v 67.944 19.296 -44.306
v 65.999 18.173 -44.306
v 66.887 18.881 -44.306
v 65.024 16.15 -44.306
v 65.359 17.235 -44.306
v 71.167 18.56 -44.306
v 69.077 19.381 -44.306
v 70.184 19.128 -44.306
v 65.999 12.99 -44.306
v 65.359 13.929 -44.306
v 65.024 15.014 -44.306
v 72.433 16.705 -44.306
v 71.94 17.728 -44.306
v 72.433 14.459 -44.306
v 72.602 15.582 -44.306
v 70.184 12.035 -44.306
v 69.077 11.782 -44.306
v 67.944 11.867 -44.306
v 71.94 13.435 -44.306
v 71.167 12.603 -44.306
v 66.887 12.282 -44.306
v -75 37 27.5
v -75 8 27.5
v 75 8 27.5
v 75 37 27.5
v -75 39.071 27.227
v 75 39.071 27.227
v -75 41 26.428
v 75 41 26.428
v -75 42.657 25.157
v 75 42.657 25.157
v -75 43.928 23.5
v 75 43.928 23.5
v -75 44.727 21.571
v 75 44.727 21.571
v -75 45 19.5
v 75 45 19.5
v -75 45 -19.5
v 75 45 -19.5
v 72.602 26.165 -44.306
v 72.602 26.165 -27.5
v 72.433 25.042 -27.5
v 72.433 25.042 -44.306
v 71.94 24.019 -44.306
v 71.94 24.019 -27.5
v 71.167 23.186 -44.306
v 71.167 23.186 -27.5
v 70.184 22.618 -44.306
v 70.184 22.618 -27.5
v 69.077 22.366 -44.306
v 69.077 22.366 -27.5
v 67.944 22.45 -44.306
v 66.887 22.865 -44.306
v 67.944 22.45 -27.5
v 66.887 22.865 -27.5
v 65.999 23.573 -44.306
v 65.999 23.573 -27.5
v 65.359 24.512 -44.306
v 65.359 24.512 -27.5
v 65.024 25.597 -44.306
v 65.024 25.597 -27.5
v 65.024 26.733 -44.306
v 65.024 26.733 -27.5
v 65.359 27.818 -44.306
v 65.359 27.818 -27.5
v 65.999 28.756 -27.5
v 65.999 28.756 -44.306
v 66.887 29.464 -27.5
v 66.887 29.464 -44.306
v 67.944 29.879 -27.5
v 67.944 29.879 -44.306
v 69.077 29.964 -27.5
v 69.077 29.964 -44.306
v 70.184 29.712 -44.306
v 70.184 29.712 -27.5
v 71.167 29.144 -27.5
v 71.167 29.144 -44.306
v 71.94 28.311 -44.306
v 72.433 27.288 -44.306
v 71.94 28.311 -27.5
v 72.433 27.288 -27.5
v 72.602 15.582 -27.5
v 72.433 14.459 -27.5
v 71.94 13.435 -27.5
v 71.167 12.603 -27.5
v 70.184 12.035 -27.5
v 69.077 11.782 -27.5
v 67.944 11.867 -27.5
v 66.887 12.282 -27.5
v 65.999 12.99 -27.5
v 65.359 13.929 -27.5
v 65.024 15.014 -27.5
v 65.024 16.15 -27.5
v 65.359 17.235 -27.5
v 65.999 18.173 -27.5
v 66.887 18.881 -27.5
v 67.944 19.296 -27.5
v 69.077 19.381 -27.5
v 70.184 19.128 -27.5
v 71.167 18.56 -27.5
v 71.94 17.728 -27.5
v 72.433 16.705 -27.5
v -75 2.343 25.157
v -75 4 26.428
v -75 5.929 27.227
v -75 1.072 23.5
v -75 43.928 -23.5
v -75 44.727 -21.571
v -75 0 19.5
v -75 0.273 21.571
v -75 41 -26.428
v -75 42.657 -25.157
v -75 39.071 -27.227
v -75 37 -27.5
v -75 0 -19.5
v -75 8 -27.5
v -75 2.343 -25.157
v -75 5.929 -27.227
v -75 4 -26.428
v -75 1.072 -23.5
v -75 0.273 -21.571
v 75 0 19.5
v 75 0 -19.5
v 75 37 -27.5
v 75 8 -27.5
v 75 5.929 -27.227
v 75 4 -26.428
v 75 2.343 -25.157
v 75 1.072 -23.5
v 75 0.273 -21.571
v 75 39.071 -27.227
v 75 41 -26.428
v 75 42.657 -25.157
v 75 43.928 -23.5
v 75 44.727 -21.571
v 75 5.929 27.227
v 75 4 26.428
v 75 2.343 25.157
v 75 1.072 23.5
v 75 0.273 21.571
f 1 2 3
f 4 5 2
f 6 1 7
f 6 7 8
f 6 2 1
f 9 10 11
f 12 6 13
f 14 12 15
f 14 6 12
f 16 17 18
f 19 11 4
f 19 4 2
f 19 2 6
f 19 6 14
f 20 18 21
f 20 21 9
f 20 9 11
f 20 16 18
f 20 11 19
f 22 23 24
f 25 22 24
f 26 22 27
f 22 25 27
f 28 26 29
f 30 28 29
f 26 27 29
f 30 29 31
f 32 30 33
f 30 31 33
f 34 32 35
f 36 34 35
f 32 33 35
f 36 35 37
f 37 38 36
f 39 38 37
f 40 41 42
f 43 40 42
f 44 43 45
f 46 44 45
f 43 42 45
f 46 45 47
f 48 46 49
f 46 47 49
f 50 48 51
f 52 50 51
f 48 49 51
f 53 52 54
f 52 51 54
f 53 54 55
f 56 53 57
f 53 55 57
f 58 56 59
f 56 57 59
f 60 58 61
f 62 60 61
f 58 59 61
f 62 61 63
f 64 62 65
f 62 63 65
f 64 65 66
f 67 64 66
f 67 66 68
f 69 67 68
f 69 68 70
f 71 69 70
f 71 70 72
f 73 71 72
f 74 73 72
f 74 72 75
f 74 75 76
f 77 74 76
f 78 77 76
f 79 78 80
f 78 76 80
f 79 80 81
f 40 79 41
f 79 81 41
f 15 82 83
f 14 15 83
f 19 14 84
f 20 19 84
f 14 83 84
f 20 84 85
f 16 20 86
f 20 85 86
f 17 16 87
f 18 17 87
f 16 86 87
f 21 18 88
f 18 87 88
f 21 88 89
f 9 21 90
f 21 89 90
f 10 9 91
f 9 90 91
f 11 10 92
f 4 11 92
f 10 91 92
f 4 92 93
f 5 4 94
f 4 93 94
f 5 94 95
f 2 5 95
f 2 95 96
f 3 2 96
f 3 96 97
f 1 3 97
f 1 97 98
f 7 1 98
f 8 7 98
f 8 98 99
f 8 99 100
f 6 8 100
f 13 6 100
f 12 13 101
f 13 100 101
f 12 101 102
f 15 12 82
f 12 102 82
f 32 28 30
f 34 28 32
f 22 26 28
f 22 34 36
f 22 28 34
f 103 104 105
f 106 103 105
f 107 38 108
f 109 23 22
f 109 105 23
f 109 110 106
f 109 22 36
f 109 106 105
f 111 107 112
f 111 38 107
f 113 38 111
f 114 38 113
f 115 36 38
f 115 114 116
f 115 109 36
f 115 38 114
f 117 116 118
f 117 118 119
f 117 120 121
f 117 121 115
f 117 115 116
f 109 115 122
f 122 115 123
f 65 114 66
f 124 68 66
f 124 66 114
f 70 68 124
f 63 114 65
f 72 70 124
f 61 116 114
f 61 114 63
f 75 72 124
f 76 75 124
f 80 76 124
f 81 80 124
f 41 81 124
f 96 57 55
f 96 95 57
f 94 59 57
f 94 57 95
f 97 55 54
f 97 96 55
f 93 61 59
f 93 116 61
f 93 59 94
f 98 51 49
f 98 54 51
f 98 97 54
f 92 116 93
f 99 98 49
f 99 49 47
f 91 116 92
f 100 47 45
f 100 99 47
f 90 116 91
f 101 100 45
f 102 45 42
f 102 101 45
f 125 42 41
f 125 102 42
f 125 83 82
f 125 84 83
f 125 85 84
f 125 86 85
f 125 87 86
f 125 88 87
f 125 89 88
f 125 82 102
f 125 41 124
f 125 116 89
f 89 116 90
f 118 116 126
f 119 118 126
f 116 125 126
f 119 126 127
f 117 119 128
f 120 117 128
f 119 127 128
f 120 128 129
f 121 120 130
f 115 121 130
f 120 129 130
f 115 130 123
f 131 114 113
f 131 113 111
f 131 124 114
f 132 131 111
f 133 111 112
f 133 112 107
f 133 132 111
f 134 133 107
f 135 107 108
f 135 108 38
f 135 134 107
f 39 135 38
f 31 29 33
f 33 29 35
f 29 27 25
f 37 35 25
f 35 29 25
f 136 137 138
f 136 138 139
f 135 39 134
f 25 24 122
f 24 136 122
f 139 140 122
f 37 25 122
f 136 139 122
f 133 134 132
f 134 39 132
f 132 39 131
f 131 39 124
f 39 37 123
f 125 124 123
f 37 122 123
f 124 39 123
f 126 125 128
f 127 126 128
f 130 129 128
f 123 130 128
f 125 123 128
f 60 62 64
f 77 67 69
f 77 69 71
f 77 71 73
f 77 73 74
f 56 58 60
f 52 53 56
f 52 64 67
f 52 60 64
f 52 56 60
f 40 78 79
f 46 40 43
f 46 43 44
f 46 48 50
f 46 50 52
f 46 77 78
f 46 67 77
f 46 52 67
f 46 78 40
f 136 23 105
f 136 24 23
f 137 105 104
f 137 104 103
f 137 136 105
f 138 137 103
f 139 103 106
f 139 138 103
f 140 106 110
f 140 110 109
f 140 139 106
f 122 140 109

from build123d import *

# Parameters (mm, degrees)
ESBO_O1_W                = 150
ESBO_O1_H                = 55
RESSALTO_EXTRUS_O1_DEPTH = 45
FILETE1_R                = 8
ESBO_O2_R                = 3.81
RESSALTO_EXTRUS_O2_DEPTH = 16.806
ESBO_O4_R                = 3.81
RESSALTO_EXTRUS_O3_DEPTH = 16.806


with BuildPart() as part:
    # Esboço1 → Ressalto-extrusão1 (new body)
    with BuildSketch(Plane(origin=(0, 0, 0), x_dir=(1, 0, 0), z_dir=(0, 1, 0))):
        Rectangle(ESBO_O1_W, ESBO_O1_H)
    extrude(amount=RESSALTO_EXTRUS_O1_DEPTH)

    # Filete1
    filete1_edges = [part.edges().sort_by_distance(p)[0] for p in [
        (0, 45, -27.5),
        (0, 0, -27.5),
        (0, 0, 27.5),
        (0, 45, 27.5),
    ]]
    fillet(filete1_edges, radius=FILETE1_R)

    # Esboço2 → Ressalto-extrusão2 (add)
    with BuildSketch(Plane(origin=(0, 0, -27.5), x_dir=(-1, 0, 0), z_dir=(0, 0, -1))):
        with Locations(Location((-68.791943754, 15.581709397, 0), (0, 0, 180))):
            Circle(ESBO_O2_R)
    extrude(amount=RESSALTO_EXTRUS_O2_DEPTH)

    # Esboço4 → Ressalto-extrusão3 (add)
    with BuildSketch(Plane(origin=(0, 0, -27.5), x_dir=(-1, 0, 0), z_dir=(0, 0, -1))):
        with Locations(Location((-68.791943754, 26.164871882, 0), (0, 0, 180))):
            Circle(ESBO_O4_R)
    extrude(amount=RESSALTO_EXTRUS_O3_DEPTH)


solid = part.part
